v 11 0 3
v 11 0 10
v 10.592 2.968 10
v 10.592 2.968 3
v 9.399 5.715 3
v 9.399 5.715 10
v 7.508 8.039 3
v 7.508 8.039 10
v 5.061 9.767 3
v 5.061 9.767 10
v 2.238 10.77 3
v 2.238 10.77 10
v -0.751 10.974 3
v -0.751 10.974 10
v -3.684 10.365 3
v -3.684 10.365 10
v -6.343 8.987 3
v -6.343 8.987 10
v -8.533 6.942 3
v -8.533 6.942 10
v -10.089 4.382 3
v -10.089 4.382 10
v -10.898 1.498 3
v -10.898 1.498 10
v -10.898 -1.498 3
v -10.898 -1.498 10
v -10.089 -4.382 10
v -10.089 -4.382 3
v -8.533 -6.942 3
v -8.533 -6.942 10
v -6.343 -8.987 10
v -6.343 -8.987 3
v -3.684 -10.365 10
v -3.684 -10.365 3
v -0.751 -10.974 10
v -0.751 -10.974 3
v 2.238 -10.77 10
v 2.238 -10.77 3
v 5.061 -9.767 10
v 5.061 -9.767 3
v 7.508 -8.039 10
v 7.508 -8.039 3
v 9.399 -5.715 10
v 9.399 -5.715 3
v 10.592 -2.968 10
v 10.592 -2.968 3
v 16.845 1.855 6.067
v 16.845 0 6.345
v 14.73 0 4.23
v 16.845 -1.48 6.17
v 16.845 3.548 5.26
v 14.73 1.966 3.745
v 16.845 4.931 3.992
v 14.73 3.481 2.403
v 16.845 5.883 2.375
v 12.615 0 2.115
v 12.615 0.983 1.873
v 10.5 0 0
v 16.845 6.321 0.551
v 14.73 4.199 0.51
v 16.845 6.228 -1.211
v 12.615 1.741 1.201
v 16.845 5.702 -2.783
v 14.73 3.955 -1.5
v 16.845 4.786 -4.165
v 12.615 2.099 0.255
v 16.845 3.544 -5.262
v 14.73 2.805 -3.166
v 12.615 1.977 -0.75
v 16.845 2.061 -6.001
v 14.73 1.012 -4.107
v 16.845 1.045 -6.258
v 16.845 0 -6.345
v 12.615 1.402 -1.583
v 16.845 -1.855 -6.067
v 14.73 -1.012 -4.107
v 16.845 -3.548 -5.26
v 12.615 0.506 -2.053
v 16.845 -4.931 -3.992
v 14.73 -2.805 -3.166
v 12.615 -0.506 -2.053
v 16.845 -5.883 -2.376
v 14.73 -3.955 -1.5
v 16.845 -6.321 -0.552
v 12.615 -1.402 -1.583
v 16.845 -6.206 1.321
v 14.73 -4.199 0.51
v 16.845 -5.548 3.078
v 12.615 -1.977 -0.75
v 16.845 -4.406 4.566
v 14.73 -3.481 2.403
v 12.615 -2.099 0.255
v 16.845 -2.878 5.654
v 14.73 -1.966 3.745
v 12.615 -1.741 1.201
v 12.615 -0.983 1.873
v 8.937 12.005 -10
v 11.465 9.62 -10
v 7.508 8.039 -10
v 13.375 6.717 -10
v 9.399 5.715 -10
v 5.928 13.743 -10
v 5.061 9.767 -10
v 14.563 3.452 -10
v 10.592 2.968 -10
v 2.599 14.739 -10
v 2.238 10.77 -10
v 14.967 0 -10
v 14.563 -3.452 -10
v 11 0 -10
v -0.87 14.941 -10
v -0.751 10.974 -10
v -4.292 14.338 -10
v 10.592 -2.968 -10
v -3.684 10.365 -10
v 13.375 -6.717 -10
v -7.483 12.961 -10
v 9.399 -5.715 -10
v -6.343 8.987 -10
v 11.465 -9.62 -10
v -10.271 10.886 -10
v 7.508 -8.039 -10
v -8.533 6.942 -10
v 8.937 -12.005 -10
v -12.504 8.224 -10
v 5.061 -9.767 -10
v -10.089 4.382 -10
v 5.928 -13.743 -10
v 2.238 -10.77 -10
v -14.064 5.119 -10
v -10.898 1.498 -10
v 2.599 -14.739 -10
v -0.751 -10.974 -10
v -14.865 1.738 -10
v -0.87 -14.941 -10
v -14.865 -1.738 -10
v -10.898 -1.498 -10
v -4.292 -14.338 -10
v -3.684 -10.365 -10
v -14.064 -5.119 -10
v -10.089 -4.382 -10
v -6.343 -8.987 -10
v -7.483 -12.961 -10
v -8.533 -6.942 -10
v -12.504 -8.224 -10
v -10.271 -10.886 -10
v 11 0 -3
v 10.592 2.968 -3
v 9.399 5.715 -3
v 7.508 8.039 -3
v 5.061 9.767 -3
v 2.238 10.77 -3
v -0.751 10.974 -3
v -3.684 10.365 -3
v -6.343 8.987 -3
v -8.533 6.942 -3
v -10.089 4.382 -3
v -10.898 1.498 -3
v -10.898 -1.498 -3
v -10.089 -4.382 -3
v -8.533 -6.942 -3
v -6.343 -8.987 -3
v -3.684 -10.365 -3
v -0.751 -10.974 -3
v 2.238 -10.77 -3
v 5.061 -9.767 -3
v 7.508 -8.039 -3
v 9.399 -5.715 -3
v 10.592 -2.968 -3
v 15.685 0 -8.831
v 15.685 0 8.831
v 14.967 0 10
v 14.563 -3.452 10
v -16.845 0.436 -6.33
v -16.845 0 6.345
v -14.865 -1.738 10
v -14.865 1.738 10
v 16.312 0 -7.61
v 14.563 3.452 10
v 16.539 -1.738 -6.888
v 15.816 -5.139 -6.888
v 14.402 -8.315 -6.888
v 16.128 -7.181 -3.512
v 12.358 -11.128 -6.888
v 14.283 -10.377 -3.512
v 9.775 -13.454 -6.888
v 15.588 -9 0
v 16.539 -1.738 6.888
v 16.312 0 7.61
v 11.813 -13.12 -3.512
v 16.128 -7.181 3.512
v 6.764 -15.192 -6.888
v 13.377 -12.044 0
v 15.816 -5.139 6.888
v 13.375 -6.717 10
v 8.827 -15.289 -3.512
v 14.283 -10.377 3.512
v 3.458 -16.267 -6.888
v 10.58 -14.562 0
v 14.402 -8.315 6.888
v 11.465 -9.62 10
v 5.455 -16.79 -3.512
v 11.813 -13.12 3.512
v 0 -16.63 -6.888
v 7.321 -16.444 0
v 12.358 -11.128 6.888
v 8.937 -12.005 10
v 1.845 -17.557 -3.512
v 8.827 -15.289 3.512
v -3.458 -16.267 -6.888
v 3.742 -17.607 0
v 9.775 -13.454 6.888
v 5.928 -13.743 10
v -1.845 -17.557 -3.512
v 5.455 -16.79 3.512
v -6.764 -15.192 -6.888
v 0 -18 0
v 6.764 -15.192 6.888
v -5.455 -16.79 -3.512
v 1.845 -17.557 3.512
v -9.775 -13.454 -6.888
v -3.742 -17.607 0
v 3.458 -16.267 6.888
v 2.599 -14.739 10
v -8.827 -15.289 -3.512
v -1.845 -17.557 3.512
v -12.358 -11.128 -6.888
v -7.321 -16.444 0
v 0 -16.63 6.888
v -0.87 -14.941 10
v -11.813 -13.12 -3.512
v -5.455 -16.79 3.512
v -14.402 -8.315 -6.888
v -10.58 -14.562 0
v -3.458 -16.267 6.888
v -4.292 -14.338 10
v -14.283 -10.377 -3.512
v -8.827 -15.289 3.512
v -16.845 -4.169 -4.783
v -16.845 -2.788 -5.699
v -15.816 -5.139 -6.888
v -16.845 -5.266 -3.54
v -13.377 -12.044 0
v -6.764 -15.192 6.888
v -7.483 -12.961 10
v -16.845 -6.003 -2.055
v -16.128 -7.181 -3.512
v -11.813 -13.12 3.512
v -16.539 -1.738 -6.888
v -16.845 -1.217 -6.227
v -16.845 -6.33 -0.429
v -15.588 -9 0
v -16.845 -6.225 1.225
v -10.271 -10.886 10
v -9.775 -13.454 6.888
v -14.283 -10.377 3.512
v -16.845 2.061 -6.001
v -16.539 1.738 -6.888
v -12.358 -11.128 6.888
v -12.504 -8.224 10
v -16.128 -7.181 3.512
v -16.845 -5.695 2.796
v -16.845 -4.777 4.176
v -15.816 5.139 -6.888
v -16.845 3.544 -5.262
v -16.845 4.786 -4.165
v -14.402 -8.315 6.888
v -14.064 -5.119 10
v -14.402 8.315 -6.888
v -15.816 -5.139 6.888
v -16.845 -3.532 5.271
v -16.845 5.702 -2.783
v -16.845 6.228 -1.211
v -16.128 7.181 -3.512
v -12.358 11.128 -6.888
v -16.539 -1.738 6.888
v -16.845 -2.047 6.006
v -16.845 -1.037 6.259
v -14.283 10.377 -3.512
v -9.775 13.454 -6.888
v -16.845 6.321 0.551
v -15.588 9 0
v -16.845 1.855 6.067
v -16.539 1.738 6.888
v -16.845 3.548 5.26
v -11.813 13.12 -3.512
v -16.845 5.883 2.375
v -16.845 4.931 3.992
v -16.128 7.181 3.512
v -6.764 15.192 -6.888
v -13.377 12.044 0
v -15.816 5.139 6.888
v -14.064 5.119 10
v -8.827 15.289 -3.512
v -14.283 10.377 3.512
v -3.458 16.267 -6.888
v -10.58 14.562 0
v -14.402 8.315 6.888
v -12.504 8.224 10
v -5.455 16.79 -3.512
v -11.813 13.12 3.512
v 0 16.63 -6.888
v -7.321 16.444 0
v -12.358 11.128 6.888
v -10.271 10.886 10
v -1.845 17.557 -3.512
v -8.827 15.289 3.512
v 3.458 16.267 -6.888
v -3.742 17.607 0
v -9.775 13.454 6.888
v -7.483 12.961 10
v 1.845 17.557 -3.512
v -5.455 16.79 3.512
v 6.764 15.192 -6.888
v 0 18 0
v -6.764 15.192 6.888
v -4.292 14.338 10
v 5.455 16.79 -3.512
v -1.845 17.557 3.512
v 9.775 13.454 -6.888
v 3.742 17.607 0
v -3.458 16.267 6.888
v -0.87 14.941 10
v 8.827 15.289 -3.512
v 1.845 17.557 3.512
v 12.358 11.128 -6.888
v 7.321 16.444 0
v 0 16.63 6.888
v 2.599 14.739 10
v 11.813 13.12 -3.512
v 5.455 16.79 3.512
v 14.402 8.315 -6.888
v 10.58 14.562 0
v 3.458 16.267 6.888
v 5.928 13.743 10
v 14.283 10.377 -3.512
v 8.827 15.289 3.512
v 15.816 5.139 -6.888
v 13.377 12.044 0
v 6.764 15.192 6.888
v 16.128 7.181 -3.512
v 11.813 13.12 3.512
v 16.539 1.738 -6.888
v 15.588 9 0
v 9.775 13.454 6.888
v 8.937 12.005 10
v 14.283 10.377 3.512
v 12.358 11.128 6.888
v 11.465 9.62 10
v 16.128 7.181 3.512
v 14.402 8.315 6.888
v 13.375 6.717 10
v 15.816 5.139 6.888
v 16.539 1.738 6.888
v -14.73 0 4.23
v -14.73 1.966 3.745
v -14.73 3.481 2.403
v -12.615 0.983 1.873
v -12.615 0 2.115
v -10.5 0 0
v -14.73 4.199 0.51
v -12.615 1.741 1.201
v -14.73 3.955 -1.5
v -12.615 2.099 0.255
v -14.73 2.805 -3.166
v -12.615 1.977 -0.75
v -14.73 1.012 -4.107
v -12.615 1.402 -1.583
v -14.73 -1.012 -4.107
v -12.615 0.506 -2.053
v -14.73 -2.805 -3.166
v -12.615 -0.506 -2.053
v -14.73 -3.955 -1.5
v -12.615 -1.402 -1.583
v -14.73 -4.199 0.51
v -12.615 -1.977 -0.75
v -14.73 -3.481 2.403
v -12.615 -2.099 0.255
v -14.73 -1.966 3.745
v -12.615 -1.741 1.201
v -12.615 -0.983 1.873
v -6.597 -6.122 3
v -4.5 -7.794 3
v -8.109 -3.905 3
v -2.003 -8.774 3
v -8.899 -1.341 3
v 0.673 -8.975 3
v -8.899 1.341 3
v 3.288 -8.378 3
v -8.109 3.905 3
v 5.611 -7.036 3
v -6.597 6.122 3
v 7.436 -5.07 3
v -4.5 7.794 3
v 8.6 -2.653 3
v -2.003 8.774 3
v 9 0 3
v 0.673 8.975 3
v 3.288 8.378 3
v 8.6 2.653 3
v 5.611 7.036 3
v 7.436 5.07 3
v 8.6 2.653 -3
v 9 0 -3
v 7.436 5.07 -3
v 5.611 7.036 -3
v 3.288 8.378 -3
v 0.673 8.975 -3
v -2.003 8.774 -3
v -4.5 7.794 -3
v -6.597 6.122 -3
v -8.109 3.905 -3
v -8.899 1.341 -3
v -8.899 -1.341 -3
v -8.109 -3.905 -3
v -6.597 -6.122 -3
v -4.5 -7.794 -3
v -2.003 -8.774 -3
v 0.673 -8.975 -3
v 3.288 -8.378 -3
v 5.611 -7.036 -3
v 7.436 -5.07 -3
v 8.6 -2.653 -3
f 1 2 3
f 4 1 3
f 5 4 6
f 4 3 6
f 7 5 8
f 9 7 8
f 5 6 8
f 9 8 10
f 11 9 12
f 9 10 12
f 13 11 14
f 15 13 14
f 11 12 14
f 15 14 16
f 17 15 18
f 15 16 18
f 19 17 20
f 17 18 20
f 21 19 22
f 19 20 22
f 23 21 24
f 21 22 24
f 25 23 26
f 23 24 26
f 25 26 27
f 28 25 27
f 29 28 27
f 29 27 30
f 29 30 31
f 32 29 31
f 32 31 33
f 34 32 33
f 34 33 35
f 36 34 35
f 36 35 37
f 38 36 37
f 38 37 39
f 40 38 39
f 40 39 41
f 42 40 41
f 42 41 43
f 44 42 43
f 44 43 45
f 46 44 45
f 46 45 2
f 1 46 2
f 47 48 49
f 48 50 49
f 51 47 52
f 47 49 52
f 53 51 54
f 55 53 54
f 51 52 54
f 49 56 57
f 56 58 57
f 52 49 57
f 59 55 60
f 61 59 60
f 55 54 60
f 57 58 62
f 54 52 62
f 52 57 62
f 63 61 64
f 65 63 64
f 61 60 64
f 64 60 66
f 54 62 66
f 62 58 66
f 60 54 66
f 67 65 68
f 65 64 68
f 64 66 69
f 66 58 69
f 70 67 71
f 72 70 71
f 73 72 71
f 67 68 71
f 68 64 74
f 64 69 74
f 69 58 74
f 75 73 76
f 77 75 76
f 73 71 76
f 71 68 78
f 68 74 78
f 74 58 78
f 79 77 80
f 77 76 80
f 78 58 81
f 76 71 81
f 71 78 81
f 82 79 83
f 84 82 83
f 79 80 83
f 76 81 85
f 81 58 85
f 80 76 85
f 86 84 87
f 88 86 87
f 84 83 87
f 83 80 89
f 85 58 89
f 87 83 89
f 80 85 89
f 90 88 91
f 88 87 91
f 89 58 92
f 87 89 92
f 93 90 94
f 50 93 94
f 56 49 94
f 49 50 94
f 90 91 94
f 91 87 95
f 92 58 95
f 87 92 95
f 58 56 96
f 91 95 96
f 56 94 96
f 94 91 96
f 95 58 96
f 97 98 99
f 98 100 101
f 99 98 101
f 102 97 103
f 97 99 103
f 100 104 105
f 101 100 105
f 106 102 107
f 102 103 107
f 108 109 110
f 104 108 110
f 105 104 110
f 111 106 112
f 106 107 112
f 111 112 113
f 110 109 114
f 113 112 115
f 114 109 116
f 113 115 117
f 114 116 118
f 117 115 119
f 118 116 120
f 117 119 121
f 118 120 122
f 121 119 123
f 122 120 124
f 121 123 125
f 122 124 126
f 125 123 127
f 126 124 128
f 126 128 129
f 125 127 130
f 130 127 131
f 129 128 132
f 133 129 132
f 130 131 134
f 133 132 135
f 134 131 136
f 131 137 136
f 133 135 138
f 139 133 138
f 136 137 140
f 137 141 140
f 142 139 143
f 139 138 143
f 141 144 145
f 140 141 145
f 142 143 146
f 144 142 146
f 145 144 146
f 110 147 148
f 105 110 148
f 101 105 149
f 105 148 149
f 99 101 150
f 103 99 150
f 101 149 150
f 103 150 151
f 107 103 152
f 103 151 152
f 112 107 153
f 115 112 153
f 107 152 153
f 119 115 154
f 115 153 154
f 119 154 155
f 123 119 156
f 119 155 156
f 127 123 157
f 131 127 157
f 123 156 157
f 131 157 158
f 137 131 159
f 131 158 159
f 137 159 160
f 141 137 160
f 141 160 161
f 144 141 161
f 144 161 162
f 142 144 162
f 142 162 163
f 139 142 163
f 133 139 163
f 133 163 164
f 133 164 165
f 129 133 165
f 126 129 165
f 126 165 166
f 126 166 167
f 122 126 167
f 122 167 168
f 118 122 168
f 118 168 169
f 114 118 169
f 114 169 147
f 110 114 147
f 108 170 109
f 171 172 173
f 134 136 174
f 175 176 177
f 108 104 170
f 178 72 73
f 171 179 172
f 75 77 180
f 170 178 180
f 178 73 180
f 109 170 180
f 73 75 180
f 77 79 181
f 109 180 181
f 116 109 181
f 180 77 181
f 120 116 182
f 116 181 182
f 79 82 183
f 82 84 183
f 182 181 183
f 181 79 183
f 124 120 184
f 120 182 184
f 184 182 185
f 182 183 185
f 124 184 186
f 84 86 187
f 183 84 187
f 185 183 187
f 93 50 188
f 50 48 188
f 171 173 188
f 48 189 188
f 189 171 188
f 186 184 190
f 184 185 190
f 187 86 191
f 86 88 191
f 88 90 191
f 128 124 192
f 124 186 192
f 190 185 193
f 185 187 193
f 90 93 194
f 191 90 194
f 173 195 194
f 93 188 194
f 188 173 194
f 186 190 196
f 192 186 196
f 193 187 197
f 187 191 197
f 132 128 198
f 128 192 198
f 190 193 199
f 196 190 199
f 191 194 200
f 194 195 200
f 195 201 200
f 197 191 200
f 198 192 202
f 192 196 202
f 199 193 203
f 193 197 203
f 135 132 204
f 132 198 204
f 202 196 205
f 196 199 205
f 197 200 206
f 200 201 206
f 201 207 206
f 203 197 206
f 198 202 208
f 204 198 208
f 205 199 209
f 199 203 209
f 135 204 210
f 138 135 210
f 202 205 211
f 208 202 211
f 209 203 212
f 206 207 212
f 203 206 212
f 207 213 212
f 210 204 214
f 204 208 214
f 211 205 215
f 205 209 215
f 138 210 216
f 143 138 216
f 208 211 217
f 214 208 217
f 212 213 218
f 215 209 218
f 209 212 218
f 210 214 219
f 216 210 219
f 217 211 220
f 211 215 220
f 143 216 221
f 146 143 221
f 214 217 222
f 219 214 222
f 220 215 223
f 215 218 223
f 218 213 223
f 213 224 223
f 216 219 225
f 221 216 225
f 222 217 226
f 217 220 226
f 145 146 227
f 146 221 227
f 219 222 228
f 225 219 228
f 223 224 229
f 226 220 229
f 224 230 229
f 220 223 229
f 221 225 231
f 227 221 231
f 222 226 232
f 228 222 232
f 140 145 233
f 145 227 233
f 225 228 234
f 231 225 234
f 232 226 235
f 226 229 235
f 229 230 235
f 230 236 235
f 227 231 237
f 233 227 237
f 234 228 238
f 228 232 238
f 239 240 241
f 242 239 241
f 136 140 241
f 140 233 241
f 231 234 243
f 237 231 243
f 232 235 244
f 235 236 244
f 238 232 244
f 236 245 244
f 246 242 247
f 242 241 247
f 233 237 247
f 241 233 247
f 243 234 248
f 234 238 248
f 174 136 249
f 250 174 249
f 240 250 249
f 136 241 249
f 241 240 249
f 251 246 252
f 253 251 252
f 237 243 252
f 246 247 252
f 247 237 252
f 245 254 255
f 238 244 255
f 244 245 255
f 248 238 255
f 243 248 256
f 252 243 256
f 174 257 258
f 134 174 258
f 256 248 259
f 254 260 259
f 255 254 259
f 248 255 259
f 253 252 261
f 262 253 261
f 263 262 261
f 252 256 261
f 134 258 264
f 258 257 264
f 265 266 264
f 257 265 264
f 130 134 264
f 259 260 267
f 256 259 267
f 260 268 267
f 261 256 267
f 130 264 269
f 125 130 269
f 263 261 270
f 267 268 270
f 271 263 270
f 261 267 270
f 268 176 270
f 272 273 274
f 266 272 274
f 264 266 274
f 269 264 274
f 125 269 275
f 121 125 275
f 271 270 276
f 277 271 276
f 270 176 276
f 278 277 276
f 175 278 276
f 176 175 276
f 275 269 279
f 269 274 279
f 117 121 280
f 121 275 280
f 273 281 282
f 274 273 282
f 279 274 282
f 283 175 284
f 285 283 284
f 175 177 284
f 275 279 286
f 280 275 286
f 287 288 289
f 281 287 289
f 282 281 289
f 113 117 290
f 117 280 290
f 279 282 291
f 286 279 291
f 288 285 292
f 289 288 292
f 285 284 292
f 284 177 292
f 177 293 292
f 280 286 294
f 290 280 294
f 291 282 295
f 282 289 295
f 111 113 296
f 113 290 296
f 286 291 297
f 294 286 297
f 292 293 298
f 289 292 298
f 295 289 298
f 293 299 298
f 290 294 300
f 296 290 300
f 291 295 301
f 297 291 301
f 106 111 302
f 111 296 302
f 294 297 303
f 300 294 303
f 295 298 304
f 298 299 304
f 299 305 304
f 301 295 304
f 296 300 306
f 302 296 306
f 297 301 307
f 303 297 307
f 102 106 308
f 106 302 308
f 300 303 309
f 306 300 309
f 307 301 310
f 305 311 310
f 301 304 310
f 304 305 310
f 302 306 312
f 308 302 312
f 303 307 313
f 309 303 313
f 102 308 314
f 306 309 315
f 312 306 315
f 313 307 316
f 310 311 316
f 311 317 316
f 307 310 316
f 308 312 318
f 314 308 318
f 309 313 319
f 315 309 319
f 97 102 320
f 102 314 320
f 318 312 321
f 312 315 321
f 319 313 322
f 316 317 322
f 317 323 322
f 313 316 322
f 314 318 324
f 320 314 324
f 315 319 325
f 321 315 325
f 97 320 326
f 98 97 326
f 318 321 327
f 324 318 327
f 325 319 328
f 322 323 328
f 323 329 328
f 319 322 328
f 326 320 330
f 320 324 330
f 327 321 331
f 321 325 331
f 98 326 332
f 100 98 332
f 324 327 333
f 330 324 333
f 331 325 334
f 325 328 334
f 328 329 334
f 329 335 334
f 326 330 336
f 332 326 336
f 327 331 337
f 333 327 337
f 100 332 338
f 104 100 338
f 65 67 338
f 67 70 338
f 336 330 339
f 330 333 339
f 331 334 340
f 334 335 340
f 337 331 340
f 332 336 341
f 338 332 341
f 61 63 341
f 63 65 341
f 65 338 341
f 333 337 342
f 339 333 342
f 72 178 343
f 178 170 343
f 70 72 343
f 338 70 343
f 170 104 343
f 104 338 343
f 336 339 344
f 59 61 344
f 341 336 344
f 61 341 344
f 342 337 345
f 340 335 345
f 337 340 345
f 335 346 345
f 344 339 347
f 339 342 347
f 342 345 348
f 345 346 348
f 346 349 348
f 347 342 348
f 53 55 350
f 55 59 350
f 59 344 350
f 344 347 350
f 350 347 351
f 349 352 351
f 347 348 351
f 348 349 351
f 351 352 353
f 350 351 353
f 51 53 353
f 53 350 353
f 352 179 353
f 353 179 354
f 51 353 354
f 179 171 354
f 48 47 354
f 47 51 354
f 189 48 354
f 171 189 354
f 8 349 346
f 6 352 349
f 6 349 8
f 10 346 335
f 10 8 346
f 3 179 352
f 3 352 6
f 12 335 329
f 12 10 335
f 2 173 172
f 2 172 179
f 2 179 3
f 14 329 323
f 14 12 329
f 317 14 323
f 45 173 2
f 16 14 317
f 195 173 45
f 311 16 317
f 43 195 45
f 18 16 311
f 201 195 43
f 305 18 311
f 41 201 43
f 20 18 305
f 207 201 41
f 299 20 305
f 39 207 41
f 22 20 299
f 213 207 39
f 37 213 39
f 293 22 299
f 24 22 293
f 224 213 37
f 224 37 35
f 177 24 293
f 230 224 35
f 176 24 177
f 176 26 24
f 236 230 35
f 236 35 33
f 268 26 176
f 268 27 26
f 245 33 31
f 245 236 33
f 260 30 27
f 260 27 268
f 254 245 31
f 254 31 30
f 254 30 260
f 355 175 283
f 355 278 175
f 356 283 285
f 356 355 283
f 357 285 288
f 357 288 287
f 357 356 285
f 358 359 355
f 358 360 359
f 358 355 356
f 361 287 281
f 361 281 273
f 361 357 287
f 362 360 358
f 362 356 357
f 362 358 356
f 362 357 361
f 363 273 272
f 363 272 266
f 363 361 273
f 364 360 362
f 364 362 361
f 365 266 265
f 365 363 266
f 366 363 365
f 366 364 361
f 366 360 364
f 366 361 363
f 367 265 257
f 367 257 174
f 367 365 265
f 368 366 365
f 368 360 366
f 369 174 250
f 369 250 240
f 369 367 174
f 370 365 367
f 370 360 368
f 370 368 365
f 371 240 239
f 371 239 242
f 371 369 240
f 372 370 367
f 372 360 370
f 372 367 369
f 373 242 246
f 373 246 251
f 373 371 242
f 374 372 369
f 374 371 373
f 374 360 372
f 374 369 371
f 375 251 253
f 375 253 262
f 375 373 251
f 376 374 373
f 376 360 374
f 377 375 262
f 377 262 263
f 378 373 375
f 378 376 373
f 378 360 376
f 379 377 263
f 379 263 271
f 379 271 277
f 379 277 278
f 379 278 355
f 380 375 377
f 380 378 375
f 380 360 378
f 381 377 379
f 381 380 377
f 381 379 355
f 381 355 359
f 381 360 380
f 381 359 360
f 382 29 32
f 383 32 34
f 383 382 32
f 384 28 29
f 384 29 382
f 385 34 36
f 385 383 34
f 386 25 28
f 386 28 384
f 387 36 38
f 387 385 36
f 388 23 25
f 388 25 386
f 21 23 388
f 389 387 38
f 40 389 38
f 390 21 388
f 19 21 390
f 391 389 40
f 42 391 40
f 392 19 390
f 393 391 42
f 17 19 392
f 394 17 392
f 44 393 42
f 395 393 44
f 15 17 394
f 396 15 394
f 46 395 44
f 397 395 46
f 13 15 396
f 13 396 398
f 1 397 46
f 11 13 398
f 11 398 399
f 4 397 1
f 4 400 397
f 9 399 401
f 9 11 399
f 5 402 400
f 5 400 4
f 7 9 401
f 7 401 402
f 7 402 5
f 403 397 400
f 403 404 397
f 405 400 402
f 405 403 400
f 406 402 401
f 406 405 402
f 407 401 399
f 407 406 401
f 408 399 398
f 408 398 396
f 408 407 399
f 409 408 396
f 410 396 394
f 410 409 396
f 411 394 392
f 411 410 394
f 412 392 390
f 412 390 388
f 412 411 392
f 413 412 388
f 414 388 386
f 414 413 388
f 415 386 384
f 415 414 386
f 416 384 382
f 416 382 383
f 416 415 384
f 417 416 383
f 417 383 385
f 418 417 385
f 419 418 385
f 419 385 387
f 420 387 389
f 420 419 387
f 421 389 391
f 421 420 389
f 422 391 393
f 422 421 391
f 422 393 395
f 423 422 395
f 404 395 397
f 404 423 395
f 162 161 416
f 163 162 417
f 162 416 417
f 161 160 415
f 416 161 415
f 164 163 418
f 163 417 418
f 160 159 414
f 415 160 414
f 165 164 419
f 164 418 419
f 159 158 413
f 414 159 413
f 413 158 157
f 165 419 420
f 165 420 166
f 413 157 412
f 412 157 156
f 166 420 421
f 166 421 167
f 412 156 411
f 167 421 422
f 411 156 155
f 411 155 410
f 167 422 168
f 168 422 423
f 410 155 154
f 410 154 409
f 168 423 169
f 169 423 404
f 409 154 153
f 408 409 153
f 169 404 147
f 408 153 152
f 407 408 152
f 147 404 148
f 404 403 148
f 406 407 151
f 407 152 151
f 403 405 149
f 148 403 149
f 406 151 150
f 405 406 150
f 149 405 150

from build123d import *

# Parameters (mm, degrees)
F0_W     = 14.9666295471
F0_H     = 20
F4_R     = 11
F5_DEPTH = 20.001
F6_R     = 12
F6_R_2   = 9
F7_DEPTH = 3


# Not quite as in the source:
# - a pattern or mirror of a feature is missing from the dataset's text; its kind, count and spacing are read off the source's solid


with BuildPart() as f1:
    # F0 (on Front) → F1 (revolve)
    with BuildSketch(Plane.XZ):
        with Locations((7.4833147735, 0)):
            Rectangle(F0_W, F0_H)
        with BuildLine():
            ThreePointArc((14.9666295471, -10), (18, 0), (14.9666295471, 10))
            Line((14.9666295471, 10), (14.9666295471, -10))
        make_face()
    revolve(axis=Axis((0, 0, 0), (0, 0, -1)))

    # F2 (on Top) → F3 (revolve, cut)
    with BuildSketch(Plane.XY):
        Polygon((39.5, 9), (30.5, 0), (39.5, 0), align=None)
    revolve(axis=Axis((35, 0, 0), (-1, 0, 0)), mode=Mode.SUBTRACT)

    # F4 (on face) → F5 (cut, through all)
    with BuildSketch(Plane.XY.offset(10)):
        Circle(F4_R)
    extrude(amount=-F5_DEPTH, mode=Mode.SUBTRACT)

    # F6 (on Top) → F7 (join, symmetric)
    with BuildSketch(Plane.XY):
        Circle(F6_R)
        Circle(F6_R_2, mode=Mode.SUBTRACT)
    extrude(amount=F7_DEPTH, both=True)

    # F8 (on Front) → F9 (revolve, cut)
    with BuildSketch(Plane.XZ):
        Polygon((19.5, 9), (10.5, 0), (19.5, 0), align=None)
    f9 = revolve(axis=Axis((15, 0, 0), (-1, 0, 0)), mode=Mode.SUBTRACT)

    # F9_copies: F9 across plane
    add(f9.mirror(Plane(origin=(0, 0, 0), x_dir=(0, 0, -1), z_dir=(-1, 0, 0))), mode=Mode.SUBTRACT)


solid = f1.part
